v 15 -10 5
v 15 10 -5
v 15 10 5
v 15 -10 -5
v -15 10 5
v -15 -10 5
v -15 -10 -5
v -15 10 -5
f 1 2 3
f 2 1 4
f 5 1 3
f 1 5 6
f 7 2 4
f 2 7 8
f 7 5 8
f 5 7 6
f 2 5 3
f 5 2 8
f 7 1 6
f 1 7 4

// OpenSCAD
$fn = 50;

difference() {
	union() {
		translate(v = [0, 0, 0]) {
			rotate(a = [0, 0, 0]) {
				difference() {
					union() {
						translate(v = [-15.0, -10.0, -5.0]) {
							cube(size = [30, 20, 10]);
						}
					}
					union();
				}
			}
		}
	}
	union();
}
